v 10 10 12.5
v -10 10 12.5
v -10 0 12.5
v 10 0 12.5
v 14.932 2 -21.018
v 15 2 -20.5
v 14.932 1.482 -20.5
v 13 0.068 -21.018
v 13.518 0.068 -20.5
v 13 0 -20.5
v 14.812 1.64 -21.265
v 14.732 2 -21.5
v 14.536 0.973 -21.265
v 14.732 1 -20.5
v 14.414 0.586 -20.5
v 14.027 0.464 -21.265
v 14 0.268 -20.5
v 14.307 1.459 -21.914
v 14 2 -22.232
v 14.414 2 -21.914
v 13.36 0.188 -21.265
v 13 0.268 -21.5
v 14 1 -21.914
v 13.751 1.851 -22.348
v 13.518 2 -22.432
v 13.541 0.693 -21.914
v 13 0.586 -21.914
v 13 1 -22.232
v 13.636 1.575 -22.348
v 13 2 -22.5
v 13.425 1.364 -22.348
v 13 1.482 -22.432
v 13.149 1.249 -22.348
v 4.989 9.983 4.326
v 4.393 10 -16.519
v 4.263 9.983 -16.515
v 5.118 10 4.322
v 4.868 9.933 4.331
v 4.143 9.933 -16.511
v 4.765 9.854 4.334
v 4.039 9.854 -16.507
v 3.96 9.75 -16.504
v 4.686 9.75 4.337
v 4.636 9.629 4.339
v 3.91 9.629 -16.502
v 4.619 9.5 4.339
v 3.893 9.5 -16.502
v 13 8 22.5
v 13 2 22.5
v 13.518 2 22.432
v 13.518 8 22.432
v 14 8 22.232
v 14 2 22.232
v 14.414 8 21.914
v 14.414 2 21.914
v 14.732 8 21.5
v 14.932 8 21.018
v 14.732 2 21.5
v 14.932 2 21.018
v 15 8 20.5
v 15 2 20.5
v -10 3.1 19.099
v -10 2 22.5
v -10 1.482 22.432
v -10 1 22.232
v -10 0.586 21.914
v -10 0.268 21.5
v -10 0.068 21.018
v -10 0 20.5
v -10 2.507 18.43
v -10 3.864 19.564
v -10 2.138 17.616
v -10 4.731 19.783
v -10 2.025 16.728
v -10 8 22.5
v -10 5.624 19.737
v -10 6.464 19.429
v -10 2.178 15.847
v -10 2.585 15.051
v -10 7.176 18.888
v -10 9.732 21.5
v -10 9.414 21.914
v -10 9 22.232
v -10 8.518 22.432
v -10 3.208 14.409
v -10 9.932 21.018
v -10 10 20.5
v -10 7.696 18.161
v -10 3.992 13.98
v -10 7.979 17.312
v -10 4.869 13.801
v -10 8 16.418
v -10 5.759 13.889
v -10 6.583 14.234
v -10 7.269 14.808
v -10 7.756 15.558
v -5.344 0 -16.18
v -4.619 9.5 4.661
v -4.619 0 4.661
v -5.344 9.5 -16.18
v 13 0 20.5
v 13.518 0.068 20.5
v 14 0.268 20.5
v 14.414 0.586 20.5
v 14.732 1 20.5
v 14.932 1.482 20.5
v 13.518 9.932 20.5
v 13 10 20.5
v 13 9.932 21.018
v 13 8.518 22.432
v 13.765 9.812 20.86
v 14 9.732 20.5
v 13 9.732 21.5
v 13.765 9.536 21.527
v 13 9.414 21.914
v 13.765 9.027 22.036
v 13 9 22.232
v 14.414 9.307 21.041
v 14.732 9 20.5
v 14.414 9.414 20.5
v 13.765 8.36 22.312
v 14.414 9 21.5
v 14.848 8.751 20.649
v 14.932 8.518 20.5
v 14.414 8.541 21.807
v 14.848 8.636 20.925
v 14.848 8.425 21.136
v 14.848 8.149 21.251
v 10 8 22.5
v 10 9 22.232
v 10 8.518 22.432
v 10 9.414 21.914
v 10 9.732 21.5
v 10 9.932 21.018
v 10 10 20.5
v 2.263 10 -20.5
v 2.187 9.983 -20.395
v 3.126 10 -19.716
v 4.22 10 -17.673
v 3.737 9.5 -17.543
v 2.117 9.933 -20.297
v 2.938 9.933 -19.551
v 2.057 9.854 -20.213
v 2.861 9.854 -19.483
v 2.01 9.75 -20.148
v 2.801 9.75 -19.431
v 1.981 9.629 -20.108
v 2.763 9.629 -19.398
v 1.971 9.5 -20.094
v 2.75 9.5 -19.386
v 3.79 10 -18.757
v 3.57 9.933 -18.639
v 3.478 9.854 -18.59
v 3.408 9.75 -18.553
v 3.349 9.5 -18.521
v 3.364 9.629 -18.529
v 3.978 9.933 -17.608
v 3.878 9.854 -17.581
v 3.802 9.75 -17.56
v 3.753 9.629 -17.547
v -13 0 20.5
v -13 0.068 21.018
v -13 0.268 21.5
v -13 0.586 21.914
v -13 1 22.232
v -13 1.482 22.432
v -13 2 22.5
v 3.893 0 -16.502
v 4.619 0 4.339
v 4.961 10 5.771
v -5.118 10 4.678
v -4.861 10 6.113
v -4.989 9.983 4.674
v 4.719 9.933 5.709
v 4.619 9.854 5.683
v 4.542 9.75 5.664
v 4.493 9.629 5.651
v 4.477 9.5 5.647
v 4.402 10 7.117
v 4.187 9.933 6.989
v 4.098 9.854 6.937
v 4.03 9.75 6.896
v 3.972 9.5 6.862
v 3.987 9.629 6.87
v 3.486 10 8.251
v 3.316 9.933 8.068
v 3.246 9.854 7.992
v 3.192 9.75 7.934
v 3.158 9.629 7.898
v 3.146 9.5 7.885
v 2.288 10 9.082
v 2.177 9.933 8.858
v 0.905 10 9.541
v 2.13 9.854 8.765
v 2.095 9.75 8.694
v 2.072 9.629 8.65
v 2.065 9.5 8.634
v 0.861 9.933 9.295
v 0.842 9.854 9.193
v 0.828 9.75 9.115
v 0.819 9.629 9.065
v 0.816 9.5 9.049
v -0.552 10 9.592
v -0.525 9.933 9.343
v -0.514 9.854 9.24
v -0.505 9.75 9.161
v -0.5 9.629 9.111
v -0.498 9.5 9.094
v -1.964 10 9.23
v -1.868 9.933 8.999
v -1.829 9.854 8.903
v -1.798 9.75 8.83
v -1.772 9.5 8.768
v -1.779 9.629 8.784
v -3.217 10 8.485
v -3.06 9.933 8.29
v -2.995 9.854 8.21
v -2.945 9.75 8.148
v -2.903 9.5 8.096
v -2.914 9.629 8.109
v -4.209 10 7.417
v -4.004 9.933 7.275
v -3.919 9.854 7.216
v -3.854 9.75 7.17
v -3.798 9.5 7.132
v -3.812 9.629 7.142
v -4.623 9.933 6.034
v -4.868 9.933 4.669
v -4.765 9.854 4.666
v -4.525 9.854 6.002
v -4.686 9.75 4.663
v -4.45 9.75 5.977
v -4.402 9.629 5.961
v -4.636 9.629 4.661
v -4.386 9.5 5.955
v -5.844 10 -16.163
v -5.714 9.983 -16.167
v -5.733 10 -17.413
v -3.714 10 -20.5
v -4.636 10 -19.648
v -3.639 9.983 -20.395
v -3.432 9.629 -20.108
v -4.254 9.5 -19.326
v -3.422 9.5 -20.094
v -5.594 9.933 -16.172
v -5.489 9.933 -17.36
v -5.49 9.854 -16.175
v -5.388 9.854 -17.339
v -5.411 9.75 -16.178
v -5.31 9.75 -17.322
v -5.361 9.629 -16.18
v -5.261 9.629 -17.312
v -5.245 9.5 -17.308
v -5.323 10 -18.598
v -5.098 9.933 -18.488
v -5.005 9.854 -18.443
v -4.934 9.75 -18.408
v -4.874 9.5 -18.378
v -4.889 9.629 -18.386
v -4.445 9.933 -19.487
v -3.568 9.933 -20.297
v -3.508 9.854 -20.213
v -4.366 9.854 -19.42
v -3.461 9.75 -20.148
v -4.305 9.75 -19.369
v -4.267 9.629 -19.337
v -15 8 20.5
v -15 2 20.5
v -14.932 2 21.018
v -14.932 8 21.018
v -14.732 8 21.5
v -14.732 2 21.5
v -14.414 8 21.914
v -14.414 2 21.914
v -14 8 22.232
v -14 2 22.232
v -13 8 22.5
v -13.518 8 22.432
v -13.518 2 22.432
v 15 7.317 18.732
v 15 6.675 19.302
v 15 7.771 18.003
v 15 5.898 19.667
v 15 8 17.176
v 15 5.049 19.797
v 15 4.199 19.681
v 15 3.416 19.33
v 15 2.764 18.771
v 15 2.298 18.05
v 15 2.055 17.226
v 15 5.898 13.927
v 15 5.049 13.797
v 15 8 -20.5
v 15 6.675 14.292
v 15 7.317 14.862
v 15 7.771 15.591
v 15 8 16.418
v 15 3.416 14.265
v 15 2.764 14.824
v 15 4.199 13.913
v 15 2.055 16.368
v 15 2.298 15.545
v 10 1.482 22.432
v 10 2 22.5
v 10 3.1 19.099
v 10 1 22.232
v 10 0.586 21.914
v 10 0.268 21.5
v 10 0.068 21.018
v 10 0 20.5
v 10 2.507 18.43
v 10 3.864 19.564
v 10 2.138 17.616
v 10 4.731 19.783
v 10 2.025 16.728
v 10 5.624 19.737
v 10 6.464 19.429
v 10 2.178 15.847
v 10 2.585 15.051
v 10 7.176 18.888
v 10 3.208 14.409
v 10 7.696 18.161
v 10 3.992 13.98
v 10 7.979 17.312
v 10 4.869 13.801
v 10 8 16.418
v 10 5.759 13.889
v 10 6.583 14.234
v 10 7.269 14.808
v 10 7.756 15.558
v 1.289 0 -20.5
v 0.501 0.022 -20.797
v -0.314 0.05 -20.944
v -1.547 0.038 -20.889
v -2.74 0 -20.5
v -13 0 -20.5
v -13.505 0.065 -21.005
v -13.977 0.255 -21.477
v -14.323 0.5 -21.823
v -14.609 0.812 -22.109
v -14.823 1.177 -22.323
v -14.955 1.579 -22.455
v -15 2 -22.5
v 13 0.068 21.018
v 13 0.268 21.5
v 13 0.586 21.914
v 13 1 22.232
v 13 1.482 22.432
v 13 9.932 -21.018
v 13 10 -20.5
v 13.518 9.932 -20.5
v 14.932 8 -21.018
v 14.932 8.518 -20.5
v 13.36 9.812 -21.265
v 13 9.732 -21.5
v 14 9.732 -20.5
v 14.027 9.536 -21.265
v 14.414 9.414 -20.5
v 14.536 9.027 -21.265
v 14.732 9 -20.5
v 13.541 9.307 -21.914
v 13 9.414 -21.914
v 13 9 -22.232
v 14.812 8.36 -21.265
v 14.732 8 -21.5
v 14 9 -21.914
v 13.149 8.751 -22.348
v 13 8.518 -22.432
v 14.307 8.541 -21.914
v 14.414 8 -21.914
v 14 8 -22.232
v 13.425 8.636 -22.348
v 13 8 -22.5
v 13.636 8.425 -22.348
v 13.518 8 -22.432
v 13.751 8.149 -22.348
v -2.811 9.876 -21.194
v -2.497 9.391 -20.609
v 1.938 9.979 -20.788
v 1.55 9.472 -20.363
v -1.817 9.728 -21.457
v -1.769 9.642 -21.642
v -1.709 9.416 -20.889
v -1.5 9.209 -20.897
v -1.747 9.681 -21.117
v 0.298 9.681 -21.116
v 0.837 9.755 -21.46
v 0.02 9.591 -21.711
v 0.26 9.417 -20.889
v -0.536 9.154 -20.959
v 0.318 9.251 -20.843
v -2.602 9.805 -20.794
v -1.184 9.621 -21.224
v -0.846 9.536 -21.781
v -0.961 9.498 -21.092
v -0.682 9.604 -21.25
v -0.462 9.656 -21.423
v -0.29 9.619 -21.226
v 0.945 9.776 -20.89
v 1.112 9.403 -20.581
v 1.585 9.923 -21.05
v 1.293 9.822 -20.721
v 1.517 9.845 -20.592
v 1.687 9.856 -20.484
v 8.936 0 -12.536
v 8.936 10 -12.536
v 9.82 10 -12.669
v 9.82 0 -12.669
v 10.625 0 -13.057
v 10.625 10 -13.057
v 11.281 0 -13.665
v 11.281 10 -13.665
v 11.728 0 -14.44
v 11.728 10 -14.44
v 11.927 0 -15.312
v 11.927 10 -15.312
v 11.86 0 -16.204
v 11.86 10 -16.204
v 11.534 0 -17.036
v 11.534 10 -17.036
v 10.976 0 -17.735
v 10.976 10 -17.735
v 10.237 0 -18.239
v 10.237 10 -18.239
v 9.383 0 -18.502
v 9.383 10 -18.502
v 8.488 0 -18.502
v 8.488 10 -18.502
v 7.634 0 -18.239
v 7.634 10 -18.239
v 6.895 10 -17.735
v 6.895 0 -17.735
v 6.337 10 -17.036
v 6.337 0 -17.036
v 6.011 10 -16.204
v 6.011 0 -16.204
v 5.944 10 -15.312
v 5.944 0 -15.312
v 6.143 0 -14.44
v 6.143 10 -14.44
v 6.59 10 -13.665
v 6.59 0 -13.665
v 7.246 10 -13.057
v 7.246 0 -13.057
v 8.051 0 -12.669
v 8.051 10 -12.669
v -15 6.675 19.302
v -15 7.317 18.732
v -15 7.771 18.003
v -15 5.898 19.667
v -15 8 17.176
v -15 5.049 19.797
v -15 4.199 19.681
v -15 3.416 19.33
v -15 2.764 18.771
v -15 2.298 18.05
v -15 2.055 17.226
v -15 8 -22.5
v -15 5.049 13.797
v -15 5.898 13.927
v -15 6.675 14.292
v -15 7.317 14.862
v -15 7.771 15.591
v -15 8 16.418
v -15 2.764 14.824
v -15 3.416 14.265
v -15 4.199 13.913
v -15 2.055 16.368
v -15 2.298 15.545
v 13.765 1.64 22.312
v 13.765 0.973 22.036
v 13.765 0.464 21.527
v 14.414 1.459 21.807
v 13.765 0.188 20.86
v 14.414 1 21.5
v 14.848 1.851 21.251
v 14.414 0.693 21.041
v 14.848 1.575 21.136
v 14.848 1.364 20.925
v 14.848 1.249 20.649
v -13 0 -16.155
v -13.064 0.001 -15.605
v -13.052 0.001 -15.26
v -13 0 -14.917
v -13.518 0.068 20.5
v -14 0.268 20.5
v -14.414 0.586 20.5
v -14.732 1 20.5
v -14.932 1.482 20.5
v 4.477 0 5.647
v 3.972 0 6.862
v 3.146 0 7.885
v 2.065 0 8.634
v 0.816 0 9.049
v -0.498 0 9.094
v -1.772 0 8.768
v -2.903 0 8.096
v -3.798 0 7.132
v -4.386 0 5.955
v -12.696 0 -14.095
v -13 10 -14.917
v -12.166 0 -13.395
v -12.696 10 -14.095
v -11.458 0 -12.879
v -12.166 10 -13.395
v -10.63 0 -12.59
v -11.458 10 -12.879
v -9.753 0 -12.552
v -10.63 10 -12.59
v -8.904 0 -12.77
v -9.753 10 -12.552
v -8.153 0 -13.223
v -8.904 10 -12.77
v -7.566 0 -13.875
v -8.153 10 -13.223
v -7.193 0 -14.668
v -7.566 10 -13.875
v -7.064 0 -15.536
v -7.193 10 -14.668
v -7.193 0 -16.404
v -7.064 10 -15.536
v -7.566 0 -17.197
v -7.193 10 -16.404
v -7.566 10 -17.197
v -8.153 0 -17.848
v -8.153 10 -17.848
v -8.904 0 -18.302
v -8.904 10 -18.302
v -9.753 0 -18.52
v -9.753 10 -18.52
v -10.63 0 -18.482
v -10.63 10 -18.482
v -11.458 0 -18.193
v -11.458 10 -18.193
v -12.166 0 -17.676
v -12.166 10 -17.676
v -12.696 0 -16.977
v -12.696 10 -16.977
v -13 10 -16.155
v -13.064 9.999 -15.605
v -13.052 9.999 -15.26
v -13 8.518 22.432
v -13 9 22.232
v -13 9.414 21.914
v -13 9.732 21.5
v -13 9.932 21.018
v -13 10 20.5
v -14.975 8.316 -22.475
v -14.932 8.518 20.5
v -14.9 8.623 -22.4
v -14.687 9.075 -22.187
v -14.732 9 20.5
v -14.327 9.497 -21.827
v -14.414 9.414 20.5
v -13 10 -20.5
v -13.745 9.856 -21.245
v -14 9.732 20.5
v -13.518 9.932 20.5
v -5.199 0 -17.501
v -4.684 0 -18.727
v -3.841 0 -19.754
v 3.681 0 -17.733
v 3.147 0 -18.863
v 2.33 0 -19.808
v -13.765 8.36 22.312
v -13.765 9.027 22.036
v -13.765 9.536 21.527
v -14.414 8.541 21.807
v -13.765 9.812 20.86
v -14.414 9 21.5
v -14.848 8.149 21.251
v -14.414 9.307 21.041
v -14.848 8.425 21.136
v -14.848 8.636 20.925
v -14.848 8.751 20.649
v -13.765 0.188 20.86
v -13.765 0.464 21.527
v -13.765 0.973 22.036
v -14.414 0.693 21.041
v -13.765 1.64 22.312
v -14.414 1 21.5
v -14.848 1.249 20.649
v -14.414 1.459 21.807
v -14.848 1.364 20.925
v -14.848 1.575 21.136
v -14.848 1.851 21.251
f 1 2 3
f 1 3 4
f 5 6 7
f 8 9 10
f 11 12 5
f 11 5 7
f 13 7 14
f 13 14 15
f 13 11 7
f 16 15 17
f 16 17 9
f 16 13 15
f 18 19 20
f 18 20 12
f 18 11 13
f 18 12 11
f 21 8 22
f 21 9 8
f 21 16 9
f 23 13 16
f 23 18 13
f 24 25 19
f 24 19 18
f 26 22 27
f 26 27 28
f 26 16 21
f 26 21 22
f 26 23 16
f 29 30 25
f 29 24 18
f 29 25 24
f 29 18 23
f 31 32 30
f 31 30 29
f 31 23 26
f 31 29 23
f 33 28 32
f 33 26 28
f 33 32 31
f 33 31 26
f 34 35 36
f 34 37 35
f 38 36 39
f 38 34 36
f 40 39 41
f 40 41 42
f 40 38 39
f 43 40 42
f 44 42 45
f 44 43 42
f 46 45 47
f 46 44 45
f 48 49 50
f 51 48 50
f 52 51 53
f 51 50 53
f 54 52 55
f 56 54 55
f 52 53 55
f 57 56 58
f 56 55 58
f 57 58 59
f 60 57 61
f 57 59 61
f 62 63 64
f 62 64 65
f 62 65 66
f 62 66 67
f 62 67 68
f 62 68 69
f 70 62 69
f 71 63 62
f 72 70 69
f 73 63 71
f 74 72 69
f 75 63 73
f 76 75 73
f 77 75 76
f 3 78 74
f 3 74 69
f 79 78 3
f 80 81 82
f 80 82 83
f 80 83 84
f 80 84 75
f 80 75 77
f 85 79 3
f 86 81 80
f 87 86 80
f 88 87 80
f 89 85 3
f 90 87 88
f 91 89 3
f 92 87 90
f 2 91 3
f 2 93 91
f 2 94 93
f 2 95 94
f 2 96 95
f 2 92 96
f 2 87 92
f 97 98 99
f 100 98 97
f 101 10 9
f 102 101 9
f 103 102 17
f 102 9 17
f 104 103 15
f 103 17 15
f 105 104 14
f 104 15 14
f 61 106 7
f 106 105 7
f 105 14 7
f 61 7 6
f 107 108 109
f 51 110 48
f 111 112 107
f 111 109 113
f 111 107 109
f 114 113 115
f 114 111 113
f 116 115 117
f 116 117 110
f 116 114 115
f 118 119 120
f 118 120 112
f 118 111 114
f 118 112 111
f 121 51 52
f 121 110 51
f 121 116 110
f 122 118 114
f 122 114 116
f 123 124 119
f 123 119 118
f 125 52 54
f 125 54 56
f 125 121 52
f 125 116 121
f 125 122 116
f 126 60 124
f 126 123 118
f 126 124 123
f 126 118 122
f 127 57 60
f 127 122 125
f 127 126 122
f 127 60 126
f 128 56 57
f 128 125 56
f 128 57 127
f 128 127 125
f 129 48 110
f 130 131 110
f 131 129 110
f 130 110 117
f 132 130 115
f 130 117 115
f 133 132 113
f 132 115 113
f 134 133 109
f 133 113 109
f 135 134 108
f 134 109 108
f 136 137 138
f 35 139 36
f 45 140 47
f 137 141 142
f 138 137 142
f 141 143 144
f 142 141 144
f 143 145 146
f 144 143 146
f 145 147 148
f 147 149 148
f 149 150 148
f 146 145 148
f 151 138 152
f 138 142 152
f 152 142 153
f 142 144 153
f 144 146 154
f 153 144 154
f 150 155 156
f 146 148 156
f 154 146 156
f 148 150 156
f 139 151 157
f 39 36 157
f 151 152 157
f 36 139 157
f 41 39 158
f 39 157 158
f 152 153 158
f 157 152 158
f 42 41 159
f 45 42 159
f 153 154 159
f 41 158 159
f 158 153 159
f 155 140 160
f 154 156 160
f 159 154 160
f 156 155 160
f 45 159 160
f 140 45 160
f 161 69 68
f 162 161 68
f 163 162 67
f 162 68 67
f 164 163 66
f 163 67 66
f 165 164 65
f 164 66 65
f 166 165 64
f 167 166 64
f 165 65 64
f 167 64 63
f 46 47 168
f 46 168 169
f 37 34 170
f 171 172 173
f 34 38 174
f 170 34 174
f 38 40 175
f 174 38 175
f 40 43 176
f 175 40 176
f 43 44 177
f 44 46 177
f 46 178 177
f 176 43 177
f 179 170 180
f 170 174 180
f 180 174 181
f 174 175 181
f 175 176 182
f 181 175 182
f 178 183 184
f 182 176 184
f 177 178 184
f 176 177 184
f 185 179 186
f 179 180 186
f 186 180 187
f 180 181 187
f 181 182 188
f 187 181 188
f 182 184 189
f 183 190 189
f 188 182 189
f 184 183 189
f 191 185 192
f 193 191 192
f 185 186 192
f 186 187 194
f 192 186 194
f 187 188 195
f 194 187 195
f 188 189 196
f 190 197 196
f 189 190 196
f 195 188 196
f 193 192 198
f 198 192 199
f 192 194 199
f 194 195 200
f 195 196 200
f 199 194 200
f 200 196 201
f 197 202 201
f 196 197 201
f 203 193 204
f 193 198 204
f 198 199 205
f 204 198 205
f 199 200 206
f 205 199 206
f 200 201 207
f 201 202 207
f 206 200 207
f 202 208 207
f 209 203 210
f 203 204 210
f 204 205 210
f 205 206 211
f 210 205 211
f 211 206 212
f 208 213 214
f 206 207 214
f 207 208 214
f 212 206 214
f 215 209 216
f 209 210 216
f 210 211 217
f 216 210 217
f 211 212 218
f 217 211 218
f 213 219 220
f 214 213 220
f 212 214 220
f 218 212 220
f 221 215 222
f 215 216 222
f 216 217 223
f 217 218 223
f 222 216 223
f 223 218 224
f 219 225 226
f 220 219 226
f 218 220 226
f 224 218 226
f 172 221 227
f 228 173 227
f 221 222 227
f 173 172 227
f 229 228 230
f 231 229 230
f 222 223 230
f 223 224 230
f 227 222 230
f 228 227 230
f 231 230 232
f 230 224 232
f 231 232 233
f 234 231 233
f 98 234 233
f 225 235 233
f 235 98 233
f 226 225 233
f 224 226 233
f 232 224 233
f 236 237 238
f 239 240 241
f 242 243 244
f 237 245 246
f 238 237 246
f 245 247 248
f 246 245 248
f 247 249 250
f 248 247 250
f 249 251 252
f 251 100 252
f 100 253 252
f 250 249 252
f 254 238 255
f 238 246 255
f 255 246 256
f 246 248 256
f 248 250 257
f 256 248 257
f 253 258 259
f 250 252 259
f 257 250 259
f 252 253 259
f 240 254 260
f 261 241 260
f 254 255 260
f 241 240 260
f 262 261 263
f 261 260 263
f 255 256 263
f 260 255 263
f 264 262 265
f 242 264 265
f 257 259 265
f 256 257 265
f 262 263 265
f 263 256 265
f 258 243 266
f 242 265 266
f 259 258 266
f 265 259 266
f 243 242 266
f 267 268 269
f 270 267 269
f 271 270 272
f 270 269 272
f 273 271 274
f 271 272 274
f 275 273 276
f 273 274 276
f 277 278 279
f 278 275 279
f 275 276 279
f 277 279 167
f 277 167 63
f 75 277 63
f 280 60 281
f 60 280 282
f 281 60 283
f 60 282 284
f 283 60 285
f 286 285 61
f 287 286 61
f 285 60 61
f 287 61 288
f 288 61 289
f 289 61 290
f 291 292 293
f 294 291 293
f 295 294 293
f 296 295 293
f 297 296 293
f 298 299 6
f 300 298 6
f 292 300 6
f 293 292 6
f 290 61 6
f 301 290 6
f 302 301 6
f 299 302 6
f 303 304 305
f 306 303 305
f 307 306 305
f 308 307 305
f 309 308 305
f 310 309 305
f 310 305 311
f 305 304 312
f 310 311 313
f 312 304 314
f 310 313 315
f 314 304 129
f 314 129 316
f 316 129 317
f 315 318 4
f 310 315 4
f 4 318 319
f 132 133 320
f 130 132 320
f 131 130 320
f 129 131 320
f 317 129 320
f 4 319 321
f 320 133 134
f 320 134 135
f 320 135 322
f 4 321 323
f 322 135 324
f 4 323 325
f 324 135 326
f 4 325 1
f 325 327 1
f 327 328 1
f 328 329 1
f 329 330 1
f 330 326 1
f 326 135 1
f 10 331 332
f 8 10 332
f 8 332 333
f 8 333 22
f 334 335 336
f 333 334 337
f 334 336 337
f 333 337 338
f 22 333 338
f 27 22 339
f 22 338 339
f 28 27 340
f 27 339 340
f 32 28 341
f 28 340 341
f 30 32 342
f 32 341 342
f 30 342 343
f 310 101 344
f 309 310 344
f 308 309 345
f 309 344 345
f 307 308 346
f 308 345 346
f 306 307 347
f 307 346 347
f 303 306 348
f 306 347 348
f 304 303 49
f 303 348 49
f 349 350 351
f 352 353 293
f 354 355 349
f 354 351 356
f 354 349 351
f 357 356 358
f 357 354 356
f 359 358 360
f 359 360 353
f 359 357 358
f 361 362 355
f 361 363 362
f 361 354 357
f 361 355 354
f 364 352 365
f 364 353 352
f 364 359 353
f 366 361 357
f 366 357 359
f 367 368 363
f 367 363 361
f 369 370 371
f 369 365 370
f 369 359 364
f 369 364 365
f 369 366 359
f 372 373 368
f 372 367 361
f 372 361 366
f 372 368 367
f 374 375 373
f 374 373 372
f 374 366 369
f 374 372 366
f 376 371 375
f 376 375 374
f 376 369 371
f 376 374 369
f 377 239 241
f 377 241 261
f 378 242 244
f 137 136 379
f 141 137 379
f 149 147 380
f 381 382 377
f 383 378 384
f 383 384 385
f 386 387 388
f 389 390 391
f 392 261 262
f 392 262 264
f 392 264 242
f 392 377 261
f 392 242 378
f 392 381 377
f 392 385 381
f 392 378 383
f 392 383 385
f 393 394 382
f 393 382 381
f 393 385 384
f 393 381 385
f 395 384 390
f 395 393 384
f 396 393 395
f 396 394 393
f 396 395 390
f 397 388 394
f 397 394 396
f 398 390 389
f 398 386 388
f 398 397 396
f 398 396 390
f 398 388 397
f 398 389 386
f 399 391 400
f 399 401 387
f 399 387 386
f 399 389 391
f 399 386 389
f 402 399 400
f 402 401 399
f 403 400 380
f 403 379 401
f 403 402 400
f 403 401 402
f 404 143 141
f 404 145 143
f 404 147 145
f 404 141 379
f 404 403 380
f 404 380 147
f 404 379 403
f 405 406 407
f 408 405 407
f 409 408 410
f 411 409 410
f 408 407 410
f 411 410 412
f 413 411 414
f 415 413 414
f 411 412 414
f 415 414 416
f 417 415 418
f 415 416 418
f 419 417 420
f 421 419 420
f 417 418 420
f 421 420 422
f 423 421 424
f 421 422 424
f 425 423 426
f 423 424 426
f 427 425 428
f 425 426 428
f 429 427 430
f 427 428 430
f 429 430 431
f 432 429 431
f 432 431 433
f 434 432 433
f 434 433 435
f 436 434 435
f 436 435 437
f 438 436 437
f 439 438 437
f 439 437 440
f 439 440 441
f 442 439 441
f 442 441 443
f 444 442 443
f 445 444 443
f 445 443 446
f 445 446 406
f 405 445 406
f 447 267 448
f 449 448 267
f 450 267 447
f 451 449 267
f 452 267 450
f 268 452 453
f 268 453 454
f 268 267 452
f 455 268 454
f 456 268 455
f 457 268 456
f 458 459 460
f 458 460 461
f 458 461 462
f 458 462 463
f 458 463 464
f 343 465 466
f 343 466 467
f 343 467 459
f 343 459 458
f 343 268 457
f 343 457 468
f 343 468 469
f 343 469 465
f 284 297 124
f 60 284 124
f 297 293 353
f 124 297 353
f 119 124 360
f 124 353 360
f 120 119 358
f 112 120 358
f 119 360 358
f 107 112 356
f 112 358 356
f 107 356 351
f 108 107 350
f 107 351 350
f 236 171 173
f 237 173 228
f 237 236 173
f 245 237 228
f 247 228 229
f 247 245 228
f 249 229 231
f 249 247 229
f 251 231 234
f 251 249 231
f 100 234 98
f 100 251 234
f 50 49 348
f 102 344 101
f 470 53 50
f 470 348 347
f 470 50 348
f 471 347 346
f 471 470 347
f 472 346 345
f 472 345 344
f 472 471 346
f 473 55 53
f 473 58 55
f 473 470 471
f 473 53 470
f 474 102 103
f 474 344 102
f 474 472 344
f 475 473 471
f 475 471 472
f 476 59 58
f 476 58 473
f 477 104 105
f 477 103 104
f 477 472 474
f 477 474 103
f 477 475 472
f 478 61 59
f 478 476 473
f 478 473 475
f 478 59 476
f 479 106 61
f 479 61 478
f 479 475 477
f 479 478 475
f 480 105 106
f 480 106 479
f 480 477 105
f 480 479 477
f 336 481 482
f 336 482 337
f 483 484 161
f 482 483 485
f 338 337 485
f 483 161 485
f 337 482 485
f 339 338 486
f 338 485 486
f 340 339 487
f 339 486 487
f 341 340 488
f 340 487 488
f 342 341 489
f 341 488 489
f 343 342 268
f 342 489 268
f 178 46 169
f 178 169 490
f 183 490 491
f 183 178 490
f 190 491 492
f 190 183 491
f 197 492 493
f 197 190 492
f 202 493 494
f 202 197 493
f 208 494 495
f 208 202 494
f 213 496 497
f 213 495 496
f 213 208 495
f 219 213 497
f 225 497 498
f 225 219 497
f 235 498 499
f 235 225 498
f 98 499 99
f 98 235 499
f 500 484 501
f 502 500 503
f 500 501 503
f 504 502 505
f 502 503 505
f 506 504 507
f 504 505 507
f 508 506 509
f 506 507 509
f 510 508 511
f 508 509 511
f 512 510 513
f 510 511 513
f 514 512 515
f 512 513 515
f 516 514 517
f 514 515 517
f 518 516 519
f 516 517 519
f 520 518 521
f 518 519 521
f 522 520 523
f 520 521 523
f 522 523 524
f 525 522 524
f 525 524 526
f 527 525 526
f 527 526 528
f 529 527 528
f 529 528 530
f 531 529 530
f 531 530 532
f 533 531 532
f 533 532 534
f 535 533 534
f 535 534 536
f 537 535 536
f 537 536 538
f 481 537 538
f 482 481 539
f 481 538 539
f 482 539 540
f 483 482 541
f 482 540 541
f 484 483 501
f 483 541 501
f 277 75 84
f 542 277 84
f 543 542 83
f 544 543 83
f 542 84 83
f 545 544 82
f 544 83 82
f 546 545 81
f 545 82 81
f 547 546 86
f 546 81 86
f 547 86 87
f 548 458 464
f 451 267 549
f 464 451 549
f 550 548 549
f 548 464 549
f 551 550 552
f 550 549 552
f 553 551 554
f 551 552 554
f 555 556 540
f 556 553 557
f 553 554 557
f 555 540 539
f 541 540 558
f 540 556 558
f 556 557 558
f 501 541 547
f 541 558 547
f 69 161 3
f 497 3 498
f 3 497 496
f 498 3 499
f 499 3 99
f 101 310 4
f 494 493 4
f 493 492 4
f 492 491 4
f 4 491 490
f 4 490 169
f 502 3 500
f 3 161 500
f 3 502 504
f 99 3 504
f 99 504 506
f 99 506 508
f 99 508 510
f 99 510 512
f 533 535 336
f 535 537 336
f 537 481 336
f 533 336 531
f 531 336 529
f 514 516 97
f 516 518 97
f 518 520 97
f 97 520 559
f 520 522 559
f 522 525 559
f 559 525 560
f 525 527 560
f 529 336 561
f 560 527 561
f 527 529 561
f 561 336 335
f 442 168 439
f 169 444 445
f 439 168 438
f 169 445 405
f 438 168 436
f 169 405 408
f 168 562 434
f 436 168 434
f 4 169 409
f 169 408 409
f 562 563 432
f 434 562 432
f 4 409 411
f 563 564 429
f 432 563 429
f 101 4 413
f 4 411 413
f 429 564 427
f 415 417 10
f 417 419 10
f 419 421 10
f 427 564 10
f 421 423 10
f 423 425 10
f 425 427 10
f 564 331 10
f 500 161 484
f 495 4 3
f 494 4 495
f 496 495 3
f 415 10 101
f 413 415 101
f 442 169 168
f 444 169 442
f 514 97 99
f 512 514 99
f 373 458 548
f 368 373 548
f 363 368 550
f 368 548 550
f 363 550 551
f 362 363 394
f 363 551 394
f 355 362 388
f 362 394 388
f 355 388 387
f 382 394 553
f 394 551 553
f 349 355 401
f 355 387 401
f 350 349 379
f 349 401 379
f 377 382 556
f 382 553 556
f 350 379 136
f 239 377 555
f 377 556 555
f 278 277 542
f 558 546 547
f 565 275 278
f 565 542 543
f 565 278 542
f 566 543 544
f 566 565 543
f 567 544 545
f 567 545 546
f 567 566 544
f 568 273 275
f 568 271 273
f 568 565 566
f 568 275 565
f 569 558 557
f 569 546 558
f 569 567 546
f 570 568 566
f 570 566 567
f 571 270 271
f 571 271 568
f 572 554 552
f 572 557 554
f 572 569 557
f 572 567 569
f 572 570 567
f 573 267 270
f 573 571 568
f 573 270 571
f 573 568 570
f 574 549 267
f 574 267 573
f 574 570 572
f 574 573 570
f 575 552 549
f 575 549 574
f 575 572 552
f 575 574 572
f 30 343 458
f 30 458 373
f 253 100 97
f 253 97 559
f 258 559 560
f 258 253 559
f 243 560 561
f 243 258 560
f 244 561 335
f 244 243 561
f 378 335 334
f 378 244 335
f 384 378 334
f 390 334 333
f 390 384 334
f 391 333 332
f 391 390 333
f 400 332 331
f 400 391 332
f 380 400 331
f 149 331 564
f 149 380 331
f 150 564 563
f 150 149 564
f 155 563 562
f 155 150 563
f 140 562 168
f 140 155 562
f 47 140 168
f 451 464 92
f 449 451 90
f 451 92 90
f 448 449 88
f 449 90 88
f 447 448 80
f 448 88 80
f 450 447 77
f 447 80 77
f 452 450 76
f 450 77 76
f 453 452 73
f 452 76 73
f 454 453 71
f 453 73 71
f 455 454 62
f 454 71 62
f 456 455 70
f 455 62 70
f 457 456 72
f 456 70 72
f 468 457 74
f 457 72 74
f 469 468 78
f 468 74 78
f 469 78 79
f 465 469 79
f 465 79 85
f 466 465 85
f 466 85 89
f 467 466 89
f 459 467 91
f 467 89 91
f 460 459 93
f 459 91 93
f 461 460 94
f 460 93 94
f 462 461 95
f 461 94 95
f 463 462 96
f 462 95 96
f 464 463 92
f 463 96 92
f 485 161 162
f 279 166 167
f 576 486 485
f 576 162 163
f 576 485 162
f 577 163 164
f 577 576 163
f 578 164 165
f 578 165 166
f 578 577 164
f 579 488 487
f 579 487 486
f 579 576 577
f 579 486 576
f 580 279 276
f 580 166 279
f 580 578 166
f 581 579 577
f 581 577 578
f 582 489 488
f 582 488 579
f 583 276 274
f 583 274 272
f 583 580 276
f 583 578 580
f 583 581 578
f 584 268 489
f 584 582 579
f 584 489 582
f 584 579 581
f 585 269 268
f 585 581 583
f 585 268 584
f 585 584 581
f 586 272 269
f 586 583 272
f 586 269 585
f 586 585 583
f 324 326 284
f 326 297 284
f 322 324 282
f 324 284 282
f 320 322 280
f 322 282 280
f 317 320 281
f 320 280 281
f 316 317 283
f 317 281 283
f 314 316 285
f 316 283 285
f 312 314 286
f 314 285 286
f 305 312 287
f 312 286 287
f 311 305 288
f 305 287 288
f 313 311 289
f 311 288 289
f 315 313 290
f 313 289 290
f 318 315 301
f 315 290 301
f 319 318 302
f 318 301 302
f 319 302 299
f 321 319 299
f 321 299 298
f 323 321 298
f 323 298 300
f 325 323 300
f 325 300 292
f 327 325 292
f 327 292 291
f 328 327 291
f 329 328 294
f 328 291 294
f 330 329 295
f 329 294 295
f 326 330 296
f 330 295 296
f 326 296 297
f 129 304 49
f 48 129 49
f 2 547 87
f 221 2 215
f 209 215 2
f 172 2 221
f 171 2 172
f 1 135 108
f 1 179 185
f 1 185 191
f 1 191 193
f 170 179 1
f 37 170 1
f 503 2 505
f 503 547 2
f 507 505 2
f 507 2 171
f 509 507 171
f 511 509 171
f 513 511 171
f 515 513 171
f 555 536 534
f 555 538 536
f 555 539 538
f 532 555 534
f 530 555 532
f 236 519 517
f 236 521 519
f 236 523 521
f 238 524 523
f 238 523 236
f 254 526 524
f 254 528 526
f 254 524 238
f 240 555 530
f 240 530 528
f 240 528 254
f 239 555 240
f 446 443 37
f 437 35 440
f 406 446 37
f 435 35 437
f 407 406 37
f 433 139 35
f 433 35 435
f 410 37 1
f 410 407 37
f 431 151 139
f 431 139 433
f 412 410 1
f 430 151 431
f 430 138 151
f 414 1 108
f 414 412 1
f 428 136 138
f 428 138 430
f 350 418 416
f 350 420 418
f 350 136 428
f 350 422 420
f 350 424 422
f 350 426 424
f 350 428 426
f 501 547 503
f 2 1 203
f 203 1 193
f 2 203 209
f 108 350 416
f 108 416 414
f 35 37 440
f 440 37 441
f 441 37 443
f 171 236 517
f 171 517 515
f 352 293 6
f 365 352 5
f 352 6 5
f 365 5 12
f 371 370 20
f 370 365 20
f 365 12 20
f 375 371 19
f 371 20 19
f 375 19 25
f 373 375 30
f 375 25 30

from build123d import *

# Parameters (mm, degrees)
SKETCH1_W           = 30
SKETCH1_H           = 45
BOSS_EXTRUDE1_DEPTH = 10
SKETCH2_W           = 20
SKETCH2_H           = 10
CUT_EXTRUDE1_DEPTH  = 29.831406487
FILLET1_R           = 2
FILLET3_R           = 0.5
SKETCH3_R           = 3
CUT_EXTRUDE2_DEPTH  = 39.810436902
SKETCH4_R           = 3
CUT_EXTRUDE3_DEPTH  = 20


with BuildPart() as part:
    # Sketch1 → Boss-Extrude1 (new body)
    with BuildSketch(Plane(origin=(0, 0, 0), x_dir=(1, 0, 0), z_dir=(0, 1, 0))):
        Rectangle(SKETCH1_W, SKETCH1_H)
    extrude(amount=BOSS_EXTRUDE1_DEPTH)

    # Sketch2 → Cut-Extrude1 (cut, through all)
    with BuildSketch(Plane(origin=(0, 10, 0), x_dir=(1, 0, 0), z_dir=(0, 1, 0))):
        with BuildLine():
            Line((3.893045877, 16.501804419), (4.618557503, -4.339220132))
            ThreePointArc((4.618557503, -4.339220132), (0.160779868, -9.118557503), (-4.618557503, -4.660779868))
            Line((-4.618557503, -4.660779868), (-5.34406913, 16.180244684))
            ThreePointArc((-5.34406913, 16.180244684), (-0.886291494, 20.959582055), (3.893045877, 16.501804419))
        make_face()
        with Locations((0, -17.5)):
            Rectangle(SKETCH2_W, SKETCH2_H)
    extrude(amount=-CUT_EXTRUDE1_DEPTH, mode=Mode.SUBTRACT)

    # Fillet1
    # the kernel refuses this fillet: 2 mm, written as the material it takes off along each edge
    with BuildSketch(Plane(origin=(-13, 8, 20.5), x_dir=(0, 1, 0), z_dir=(-1, 0, 0))) as fillet1_piece_1_section:
        Polygon((0, 0), (FILLET1_R, 0), (FILLET1_R, -FILLET1_R), (0, -FILLET1_R), align=None)
    fillet1_piece_1 = extrude(amount=FILLET1_R, mode=Mode.PRIVATE)
    fillet1_piece_1 = fillet1_piece_1 - Plane(origin=(-13, 8, 20.5), x_dir=(0, -0.7071067811865475, -0.7071067811865475), z_dir=(-1, 0, 0)) * Sphere(FILLET1_R, mode=Mode.PRIVATE)
    add(fillet1_piece_1, mode=Mode.SUBTRACT)
    with BuildSketch(Plane(origin=(13, 2, 20.5), x_dir=(0, -1, 0), z_dir=(1, 0, 0))) as fillet1_piece_2_section:
        Polygon((0, 0), (FILLET1_R, 0), (FILLET1_R, -FILLET1_R), (0, -FILLET1_R), align=None)
    fillet1_piece_2 = extrude(amount=FILLET1_R, mode=Mode.PRIVATE)
    fillet1_piece_2 = fillet1_piece_2 - Plane(origin=(13, 2, 20.5), x_dir=(0, 0.7071067811865475, -0.7071067811865475), z_dir=(1, 0, 0)) * Sphere(FILLET1_R, mode=Mode.PRIVATE)
    add(fillet1_piece_2, mode=Mode.SUBTRACT)
    with BuildSketch(Plane(origin=(13, 8, 20.5), x_dir=(0, 1, 0), z_dir=(1, 0, 0))) as fillet1_piece_3_section:
        Polygon((0, 0), (FILLET1_R, 0), (FILLET1_R, FILLET1_R), (0, FILLET1_R), align=None)
    fillet1_piece_3 = extrude(amount=FILLET1_R, mode=Mode.PRIVATE)
    fillet1_piece_3 = fillet1_piece_3 - Plane(origin=(13, 8, 20.5), x_dir=(0, -0.7071067811865475, -0.7071067811865475), z_dir=(1, 0, 0)) * Sphere(FILLET1_R, mode=Mode.PRIVATE)
    add(fillet1_piece_3, mode=Mode.SUBTRACT)
    with BuildSketch(Plane(origin=(13, 8, -20.5), x_dir=(1, 0, 0), z_dir=(0, 0, -1))) as fillet1_piece_4_section:
        Polygon((0, 0), (FILLET1_R, 0), (FILLET1_R, -FILLET1_R), (0, -FILLET1_R), align=None)
    fillet1_piece_4 = extrude(amount=FILLET1_R, mode=Mode.PRIVATE)
    fillet1_piece_4 = fillet1_piece_4 - Plane(origin=(13, 8, -20.5), x_dir=(-0.7071067811865475, -0.7071067811865475, 0), z_dir=(0, 0, -1)) * Sphere(FILLET1_R, mode=Mode.PRIVATE)
    add(fillet1_piece_4, mode=Mode.SUBTRACT)
    with BuildSketch(Plane(origin=(-13, 2, 20.5), x_dir=(0, -1, 0), z_dir=(-1, 0, 0))) as fillet1_piece_5_section:
        Polygon((0, 0), (FILLET1_R, 0), (FILLET1_R, FILLET1_R), (0, FILLET1_R), align=None)
    fillet1_piece_5 = extrude(amount=FILLET1_R, mode=Mode.PRIVATE)
    fillet1_piece_5 = fillet1_piece_5 - Plane(origin=(-13, 2, 20.5), x_dir=(0, 0.7071067811865475, -0.7071067811865475), z_dir=(-1, 0, 0)) * Sphere(FILLET1_R, mode=Mode.PRIVATE)
    add(fillet1_piece_5, mode=Mode.SUBTRACT)
    with BuildSketch(Plane(origin=(13, 2, -20.5), x_dir=(1, 0, 0), z_dir=(0, 0, -1))) as fillet1_piece_6_section:
        Polygon((0, 0), (FILLET1_R, 0), (FILLET1_R, FILLET1_R), (0, FILLET1_R), align=None)
    fillet1_piece_6 = extrude(amount=FILLET1_R, mode=Mode.PRIVATE)
    fillet1_piece_6 = fillet1_piece_6 - Plane(origin=(13, 2, -20.5), x_dir=(-0.7071067811865475, 0.7071067811865475, 0), z_dir=(0, 0, -1)) * Sphere(FILLET1_R, mode=Mode.PRIVATE)
    add(fillet1_piece_6, mode=Mode.SUBTRACT)
    with BuildSketch(Plane(origin=(-15, 10, 20.5), x_dir=(0, -1, 0), z_dir=(0, 0, -1))) as fillet1_piece_7:
        with BuildLine():
            CenterArc((FILLET1_R, -FILLET1_R), FILLET1_R, 90, 90)
            Line((0, -FILLET1_R), (0, 0))
            Line((0, 0), (FILLET1_R, 0))
        make_face()
    extrude(amount=48, mode=Mode.SUBTRACT)
    with BuildSketch(Plane(origin=(-5, 10, 22.5), x_dir=(0, 0, -1), z_dir=(-1, 0, 0)), Plane(origin=(13, 10, 22.5), x_dir=(0, 0, -1), z_dir=(-1, 0, 0))) as fillet1_piece_8:
        with BuildLine():
            CenterArc((FILLET1_R, FILLET1_R), FILLET1_R, 180, 90)
            Line((0, FILLET1_R), (0, 0))
            Line((0, 0), (FILLET1_R, 0))
        make_face()
    extrude(amount=8, mode=Mode.SUBTRACT)
    with BuildSketch(Plane(origin=(13, 0, 22.5), x_dir=(0, 0, -1), z_dir=(-1, 0, 0)), Plane(origin=(-5, 0, 22.5), x_dir=(0, 0, -1), z_dir=(-1, 0, 0))) as fillet1_piece_9:
        with BuildLine():
            CenterArc((FILLET1_R, -FILLET1_R), FILLET1_R, 90, 90)
            Line((0, -FILLET1_R), (0, 0))
            Line((0, 0), (FILLET1_R, 0))
        make_face()
    extrude(amount=8, mode=Mode.SUBTRACT)
    with BuildSketch(Plane(origin=(15, 10, -20.5), x_dir=(0, -1, 0), z_dir=(0, 0, 1))) as fillet1_piece_10:
        with BuildLine():
            CenterArc((FILLET1_R, -FILLET1_R), FILLET1_R, 90, 90)
            Line((0, -FILLET1_R), (0, 0))
            Line((0, 0), (FILLET1_R, 0))
        make_face()
    extrude(amount=41, mode=Mode.SUBTRACT)
    with BuildSketch(Plane(origin=(-15, 0, 20.5), x_dir=(0, 1, 0), z_dir=(0, 0, -1))) as fillet1_piece_11:
        with BuildLine():
            CenterArc((FILLET1_R, FILLET1_R), FILLET1_R, 180, 90)
            Line((0, FILLET1_R), (0, 0))
            Line((0, 0), (FILLET1_R, 0))
        make_face()
    extrude(amount=48, mode=Mode.SUBTRACT)
    with BuildSketch(Plane(origin=(-20, 0, -22.5), x_dir=(0, 1, 0), z_dir=(1, 0, 0))) as fillet1_piece_12:
        with BuildLine():
            CenterArc((FILLET1_R, FILLET1_R), FILLET1_R, 180, 90)
            Line((0, FILLET1_R), (0, 0))
            Line((0, 0), (FILLET1_R, 0))
        make_face()
    extrude(amount=33, mode=Mode.SUBTRACT)
    with BuildSketch(Plane(origin=(15, 0, -20.5), x_dir=(0, 1, 0), z_dir=(0, 0, 1))) as fillet1_piece_13:
        with BuildLine():
            CenterArc((FILLET1_R, FILLET1_R), FILLET1_R, 180, 90)
            Line((0, FILLET1_R), (0, 0))
            Line((0, 0), (FILLET1_R, 0))
        make_face()
    extrude(amount=41, mode=Mode.SUBTRACT)
    with BuildSketch(Plane(origin=(-20, 10, -22.5), x_dir=(0, -1, 0), z_dir=(1, 0, 0))) as fillet1_piece_14:
        with BuildLine():
            CenterArc((FILLET1_R, -FILLET1_R), FILLET1_R, 90, 90)
            Line((0, -FILLET1_R), (0, 0))
            Line((0, 0), (FILLET1_R, 0))
        make_face()
    extrude(amount=33, mode=Mode.SUBTRACT)
    with BuildSketch(Plane(origin=(15, 2, 22.5), x_dir=(0, 0, -1), z_dir=(0, 1, 0)), Plane(origin=(15, 2, -22.5), x_dir=(-1, 0, 0), z_dir=(0, 1, 0))) as fillet1_piece_15:
        with BuildLine():
            CenterArc((FILLET1_R, FILLET1_R), FILLET1_R, 180, 90)
            Line((0, FILLET1_R), (0, 0))
            Line((0, 0), (FILLET1_R, 0))
        make_face()
    extrude(amount=6, mode=Mode.SUBTRACT)
    with BuildSketch(Plane(origin=(-15, 2, 22.5), x_dir=(0, 0, -1), z_dir=(0, 1, 0))) as fillet1_piece_16:
        with BuildLine():
            CenterArc((FILLET1_R, -FILLET1_R), FILLET1_R, 90, 90)
            Line((0, -FILLET1_R), (0, 0))
            Line((0, 0), (FILLET1_R, 0))
        make_face()
    extrude(amount=6, mode=Mode.SUBTRACT)

    # Fillet3
    fillet3_edges = [part.edges().sort_by_distance(p)[0] for p in [
        (3.14709757, 10, -18.862893222),
        (-4.981313317, 10, -5.759732408),
        (0.160779868, 10, 9.118557503),
        (4.25580169, 10, -6.081292143),
        (-4.683513839, 10, -18.726636018),
        (-0.725511627, 9.945817308, -20.962379718),
    ]]
    fillet(fillet3_edges, radius=FILLET3_R)

    # Sketch3 → Cut-Extrude2 (cut, through all)
    with BuildSketch(Plane(origin=(15, 0, 0), x_dir=(0, 0, -1), z_dir=(1, 0, 0))):
        with Locations(Location((-16.797241127, 5.024030388, 0), (0, 0, 82.743157185))):
            Circle(SKETCH3_R)
    extrude(amount=-CUT_EXTRUDE2_DEPTH, mode=Mode.SUBTRACT)

    # Sketch4 → Cut-Extrude3 (cut)
    with BuildSketch(Plane(origin=(0, 10, 0), x_dir=(1, 0, 0), z_dir=(0, 1, 0))):
        with Locations(Location((8.935504807, 15.535947381, 0), (0, 0, 270))):
            Circle(SKETCH4_R)
        with Locations(Location((-10.064495193, 15.535947381, 0), (0, 0, 191.902051239))):
            Circle(SKETCH4_R)
    extrude(amount=-CUT_EXTRUDE3_DEPTH, mode=Mode.SUBTRACT)


solid = part.part
